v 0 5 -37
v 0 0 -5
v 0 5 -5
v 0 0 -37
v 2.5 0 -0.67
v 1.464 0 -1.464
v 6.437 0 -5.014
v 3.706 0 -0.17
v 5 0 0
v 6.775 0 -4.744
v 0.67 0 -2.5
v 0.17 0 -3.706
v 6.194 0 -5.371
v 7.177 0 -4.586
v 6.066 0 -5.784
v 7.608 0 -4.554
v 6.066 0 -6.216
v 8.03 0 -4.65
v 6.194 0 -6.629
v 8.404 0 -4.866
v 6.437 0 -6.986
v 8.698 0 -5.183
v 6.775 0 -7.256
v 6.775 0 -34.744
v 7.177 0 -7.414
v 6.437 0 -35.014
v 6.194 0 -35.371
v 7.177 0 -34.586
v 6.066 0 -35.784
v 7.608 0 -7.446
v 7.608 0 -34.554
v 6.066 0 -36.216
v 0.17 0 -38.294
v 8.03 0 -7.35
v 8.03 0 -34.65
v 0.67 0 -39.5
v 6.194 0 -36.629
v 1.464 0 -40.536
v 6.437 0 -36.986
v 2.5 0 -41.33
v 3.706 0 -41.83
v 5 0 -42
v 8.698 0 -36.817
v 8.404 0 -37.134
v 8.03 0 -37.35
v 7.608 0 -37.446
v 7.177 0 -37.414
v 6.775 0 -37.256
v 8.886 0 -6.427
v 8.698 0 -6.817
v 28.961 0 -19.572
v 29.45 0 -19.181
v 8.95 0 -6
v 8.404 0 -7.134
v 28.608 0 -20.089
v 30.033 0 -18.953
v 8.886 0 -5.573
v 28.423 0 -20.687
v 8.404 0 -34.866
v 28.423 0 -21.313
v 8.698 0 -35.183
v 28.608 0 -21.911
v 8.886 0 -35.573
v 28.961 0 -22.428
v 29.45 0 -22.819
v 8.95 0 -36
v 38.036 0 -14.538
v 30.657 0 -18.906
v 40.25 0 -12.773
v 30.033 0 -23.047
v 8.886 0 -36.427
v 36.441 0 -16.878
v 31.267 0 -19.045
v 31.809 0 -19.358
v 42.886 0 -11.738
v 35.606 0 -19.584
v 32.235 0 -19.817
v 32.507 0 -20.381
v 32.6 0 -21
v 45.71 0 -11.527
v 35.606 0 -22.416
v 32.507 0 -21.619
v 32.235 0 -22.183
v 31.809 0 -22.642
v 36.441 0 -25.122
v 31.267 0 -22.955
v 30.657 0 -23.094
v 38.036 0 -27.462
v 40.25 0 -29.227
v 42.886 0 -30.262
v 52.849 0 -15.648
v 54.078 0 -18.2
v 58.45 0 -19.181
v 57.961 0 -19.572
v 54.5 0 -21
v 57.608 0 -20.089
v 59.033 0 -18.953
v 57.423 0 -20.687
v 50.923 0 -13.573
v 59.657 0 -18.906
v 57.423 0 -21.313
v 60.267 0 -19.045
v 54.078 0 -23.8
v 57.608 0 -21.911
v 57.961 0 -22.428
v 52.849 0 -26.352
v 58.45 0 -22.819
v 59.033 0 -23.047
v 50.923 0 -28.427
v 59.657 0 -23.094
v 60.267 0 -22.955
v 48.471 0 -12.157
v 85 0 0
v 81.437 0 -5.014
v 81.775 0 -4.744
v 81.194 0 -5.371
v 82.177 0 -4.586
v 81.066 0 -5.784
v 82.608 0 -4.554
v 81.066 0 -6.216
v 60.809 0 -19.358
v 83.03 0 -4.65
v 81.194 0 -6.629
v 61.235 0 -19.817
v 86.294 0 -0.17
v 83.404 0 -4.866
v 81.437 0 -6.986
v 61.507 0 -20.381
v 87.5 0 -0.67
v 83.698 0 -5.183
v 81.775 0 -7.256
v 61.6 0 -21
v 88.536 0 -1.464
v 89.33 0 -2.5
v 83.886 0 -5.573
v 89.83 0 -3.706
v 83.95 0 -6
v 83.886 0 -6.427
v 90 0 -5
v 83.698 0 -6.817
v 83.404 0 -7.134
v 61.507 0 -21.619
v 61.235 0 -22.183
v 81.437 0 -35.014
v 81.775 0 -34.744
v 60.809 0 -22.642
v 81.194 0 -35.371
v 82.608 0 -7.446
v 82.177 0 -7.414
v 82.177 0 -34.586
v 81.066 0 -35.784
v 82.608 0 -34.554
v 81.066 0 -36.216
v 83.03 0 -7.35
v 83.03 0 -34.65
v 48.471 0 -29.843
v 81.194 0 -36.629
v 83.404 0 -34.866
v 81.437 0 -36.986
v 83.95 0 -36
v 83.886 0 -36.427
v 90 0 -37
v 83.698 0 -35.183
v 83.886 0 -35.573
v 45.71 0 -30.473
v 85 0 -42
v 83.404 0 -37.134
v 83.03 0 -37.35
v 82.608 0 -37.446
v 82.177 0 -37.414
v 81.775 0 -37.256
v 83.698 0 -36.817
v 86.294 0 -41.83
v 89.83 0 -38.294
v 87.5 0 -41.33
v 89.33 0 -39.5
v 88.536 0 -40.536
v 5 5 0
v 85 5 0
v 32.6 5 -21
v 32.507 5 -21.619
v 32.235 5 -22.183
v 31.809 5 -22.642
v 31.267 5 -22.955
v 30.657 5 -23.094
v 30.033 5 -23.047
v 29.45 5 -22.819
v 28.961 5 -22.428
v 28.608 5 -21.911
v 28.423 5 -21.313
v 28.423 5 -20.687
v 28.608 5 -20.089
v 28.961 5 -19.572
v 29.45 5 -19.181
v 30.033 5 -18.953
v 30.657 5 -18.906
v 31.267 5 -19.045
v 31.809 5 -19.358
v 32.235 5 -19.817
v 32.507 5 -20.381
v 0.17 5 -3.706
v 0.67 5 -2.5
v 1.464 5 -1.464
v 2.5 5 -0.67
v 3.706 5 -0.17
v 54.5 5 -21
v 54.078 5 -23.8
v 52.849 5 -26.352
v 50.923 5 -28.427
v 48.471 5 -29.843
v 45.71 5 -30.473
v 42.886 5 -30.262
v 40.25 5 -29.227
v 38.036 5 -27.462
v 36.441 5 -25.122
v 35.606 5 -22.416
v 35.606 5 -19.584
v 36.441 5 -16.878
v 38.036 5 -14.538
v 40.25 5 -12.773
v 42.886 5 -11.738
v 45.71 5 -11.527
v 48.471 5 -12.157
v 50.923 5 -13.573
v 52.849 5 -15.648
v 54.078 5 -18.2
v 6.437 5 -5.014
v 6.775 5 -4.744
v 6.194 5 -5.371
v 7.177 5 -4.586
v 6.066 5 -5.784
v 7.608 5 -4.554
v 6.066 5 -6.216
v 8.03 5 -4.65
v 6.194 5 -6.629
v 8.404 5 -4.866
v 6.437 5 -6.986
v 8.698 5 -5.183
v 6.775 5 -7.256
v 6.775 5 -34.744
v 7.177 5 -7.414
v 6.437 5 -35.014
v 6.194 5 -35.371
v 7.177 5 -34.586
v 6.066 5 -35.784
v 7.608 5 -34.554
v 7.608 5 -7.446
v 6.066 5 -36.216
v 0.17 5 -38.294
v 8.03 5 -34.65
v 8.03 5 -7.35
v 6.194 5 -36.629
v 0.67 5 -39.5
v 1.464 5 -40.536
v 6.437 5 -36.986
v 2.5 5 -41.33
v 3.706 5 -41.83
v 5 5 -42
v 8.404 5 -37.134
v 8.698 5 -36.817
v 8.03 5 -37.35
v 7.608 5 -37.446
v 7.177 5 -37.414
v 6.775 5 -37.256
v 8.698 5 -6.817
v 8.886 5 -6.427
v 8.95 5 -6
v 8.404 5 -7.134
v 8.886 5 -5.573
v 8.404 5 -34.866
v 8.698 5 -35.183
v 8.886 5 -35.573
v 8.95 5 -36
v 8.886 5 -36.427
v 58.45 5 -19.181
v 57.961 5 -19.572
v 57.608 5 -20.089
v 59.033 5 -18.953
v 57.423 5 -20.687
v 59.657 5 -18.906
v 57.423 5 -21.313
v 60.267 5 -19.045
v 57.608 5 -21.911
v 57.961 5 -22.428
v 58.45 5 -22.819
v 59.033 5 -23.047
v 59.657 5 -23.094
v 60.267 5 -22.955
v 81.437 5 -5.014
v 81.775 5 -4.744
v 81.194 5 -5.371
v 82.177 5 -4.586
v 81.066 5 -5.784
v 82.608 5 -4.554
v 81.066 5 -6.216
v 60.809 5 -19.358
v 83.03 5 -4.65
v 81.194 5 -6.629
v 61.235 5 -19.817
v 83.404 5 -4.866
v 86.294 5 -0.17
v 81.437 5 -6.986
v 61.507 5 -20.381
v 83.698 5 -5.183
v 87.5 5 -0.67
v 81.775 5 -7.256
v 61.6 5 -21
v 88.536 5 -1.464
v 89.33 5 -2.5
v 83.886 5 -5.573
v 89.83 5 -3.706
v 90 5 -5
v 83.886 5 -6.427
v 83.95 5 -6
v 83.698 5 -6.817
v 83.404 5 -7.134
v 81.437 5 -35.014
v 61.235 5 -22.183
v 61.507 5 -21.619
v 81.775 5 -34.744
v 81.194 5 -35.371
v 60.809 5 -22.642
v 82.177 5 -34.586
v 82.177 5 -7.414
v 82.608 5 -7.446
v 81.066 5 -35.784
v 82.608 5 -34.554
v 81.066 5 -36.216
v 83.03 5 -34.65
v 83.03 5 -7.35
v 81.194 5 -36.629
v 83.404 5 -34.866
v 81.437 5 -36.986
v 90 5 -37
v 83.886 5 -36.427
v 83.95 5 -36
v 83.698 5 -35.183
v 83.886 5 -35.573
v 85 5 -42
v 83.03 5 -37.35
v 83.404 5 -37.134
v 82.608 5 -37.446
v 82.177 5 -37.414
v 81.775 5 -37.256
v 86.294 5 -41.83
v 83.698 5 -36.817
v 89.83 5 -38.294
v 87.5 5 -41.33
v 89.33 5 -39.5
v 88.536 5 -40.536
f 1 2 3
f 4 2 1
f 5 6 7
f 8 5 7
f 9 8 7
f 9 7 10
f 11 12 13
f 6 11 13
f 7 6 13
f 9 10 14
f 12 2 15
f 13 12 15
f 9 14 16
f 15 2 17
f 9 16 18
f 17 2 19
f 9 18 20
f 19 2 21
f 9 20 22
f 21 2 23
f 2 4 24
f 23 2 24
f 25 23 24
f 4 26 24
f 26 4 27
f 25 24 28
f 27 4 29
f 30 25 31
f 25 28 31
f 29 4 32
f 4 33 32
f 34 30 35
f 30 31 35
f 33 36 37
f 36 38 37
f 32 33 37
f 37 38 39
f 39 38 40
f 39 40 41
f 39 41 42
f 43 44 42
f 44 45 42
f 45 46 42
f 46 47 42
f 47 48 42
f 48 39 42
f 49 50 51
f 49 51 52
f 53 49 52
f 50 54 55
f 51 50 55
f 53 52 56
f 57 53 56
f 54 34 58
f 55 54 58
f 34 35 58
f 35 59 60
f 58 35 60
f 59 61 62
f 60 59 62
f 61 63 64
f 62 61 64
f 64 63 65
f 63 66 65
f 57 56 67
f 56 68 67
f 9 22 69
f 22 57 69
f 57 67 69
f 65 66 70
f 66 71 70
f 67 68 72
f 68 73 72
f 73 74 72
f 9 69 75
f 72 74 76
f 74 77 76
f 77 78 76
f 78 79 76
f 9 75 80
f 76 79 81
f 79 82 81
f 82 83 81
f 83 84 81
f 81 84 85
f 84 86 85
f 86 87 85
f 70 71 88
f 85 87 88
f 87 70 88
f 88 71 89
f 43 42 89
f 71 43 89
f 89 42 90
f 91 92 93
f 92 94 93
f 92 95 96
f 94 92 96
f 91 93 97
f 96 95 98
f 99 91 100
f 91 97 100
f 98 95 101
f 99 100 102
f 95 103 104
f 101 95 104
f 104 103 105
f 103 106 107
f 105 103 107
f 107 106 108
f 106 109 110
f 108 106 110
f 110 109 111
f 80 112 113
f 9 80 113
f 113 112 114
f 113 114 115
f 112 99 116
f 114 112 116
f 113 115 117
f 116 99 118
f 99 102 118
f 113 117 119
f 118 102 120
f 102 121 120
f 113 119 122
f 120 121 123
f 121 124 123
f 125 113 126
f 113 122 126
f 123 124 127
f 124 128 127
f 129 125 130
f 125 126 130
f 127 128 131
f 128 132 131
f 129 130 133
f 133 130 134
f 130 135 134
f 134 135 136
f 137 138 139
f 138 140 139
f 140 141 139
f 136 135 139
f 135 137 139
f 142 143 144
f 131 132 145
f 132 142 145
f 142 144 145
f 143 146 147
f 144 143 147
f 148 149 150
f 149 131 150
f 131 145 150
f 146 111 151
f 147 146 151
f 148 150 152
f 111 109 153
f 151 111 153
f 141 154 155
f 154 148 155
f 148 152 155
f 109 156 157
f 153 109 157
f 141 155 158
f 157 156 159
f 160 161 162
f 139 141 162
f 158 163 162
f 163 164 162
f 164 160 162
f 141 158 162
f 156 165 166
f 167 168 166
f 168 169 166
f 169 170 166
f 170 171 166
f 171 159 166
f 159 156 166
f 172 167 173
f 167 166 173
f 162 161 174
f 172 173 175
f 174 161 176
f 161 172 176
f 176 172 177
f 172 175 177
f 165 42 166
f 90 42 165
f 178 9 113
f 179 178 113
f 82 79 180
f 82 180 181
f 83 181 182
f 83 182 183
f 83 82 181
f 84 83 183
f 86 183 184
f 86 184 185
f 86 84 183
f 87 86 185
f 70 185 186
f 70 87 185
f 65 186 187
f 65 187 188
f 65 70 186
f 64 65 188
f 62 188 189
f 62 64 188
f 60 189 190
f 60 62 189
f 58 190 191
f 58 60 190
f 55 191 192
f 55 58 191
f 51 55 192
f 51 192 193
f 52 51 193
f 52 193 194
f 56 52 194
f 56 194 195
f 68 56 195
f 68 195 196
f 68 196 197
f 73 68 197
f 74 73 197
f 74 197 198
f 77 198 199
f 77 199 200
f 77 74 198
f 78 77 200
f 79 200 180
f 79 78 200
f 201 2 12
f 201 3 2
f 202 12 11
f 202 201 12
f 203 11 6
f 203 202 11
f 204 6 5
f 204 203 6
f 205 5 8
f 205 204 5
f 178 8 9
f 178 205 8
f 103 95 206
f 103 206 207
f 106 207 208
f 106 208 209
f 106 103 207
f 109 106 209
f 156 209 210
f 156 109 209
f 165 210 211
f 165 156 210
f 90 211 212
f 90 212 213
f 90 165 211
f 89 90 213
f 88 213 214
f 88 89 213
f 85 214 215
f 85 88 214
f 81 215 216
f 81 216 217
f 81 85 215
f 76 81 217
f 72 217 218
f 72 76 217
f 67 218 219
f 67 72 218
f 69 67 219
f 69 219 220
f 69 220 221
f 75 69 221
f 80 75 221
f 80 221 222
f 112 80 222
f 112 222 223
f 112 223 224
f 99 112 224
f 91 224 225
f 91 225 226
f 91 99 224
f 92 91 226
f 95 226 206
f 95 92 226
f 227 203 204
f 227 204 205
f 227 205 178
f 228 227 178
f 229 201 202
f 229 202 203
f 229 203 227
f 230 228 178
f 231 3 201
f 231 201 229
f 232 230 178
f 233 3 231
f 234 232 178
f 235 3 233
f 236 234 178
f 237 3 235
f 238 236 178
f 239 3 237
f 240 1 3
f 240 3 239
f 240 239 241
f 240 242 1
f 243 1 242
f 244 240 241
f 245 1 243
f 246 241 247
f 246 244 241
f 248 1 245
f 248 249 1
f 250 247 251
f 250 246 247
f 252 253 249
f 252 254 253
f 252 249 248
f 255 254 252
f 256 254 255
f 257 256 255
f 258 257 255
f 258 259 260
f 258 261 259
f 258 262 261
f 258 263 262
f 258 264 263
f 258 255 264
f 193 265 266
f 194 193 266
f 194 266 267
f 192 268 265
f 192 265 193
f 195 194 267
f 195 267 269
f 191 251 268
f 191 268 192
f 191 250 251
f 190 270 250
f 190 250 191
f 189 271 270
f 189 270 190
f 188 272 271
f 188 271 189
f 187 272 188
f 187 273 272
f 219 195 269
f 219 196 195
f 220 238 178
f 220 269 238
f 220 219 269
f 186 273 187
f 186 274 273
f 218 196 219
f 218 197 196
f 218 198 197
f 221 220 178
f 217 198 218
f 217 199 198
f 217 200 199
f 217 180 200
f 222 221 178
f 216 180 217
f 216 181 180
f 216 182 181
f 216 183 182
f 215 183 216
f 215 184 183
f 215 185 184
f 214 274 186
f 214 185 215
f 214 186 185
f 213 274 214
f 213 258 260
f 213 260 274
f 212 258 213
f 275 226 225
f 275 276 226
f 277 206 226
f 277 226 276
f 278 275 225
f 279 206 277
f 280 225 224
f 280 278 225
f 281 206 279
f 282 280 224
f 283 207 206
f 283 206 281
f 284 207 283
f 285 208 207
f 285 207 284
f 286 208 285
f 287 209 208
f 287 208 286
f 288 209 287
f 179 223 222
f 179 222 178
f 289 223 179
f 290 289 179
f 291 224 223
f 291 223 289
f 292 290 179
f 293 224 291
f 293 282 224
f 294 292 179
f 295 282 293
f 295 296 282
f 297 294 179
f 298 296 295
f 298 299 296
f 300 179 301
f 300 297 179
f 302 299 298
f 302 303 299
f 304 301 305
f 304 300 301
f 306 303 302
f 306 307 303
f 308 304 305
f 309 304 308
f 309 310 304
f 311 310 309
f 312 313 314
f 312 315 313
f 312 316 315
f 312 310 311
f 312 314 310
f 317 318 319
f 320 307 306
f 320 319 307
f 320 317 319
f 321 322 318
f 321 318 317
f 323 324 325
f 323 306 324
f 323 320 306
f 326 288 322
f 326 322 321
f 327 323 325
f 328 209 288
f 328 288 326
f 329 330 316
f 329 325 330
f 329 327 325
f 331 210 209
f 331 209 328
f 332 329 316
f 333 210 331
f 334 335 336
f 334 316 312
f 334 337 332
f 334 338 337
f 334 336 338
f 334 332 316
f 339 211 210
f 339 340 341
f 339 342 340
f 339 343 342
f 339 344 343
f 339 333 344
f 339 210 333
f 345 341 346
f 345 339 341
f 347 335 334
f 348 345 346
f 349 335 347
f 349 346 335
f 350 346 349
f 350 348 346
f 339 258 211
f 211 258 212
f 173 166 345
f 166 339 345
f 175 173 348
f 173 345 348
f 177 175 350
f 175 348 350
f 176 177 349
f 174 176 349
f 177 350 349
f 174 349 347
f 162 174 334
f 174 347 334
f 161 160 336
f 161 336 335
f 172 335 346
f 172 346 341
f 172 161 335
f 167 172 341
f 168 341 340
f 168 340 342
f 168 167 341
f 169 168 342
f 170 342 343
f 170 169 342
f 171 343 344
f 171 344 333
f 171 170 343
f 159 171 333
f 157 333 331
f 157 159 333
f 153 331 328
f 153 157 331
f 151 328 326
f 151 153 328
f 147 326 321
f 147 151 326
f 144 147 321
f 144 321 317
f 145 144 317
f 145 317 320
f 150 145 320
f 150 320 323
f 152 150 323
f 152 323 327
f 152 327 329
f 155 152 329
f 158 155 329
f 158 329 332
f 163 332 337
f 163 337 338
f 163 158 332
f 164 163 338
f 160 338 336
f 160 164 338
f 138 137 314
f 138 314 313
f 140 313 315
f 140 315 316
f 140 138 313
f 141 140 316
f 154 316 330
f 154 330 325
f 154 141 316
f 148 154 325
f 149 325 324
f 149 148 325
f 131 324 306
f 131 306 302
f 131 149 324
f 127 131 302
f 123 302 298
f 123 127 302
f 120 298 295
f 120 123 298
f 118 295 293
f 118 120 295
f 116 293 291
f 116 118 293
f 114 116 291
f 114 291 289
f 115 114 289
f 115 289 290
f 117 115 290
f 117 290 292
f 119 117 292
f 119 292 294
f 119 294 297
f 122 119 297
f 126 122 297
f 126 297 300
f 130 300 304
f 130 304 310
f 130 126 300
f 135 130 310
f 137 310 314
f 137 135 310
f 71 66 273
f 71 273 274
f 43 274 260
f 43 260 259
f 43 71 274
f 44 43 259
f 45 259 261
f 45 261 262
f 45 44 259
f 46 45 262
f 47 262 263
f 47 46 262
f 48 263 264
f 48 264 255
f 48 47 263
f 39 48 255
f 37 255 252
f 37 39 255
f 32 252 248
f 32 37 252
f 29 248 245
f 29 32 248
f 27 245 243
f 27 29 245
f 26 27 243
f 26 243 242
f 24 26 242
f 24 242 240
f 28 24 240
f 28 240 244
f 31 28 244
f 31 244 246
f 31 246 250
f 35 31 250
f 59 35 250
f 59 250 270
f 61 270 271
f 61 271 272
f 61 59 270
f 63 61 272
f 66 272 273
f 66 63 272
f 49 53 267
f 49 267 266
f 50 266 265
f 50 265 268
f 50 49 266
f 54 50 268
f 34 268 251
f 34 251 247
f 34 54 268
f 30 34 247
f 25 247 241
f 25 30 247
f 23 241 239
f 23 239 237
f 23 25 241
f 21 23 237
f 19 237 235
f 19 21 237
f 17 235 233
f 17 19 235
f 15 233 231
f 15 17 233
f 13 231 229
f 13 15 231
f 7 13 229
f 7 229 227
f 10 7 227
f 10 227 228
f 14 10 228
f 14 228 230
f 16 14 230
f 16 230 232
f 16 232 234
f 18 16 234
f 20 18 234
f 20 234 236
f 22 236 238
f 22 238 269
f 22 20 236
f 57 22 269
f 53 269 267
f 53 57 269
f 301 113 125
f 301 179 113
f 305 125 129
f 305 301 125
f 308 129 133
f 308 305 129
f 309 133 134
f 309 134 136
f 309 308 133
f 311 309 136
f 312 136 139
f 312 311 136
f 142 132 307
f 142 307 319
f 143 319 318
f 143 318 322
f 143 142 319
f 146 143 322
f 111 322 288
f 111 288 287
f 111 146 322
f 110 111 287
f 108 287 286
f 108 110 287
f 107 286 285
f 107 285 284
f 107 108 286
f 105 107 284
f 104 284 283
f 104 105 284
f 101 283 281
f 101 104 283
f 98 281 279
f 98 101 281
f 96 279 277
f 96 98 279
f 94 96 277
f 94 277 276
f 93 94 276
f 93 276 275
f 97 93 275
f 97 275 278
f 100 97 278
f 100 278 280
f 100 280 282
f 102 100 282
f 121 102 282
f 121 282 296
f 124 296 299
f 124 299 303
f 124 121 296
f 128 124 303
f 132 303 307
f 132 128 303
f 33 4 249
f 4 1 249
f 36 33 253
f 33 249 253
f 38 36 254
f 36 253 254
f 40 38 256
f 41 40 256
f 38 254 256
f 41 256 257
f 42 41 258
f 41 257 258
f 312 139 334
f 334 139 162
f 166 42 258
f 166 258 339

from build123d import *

# Parameters (mm, degrees)
SKETCH1_W           = 90
SKETCH1_H           = 42
SKETCH1_R           = 9.5
SKETCH1_R_2         = 2.1
SKETCH1_R_3         = 1.45
BOSS_EXTRUDE1_DEPTH = 5
FILLET1_R           = 5


with BuildPart() as part:
    # Sketch1 → Boss-Extrude1 (new body)
    with BuildSketch(Plane(origin=(0, 0, 0), x_dir=(1, 0, 0), z_dir=(0, 1, 0))):
        with Locations((45, 21)):
            Rectangle(SKETCH1_W, SKETCH1_H)
        with Locations((45, 21)):
            Circle(SKETCH1_R, mode=Mode.SUBTRACT)
        with Locations((59.5, 21)):
            Circle(SKETCH1_R_2, mode=Mode.SUBTRACT)
        with Locations((30.5, 21)):
            Circle(SKETCH1_R_2, mode=Mode.SUBTRACT)
        with Locations((7.5, 36)):
            Circle(SKETCH1_R_3, mode=Mode.SUBTRACT)
        with Locations((7.5, 6)):
            Circle(SKETCH1_R_3, mode=Mode.SUBTRACT)
        with Locations((82.5, 6)):
            Circle(SKETCH1_R_3, mode=Mode.SUBTRACT)
        with Locations((82.5, 36)):
            Circle(SKETCH1_R_3, mode=Mode.SUBTRACT)
    extrude(amount=BOSS_EXTRUDE1_DEPTH)

    # Fillet1
    fillet1_edges = [part.edges().sort_by_distance(p)[0] for p in [
        (0, 2.5, -42),
        (90, 2.5, -42),
        (90, 2.5, 0),
        (0, 2.5, 0),
    ]]
    fillet(fillet1_edges, radius=FILLET1_R)


solid = part.part
